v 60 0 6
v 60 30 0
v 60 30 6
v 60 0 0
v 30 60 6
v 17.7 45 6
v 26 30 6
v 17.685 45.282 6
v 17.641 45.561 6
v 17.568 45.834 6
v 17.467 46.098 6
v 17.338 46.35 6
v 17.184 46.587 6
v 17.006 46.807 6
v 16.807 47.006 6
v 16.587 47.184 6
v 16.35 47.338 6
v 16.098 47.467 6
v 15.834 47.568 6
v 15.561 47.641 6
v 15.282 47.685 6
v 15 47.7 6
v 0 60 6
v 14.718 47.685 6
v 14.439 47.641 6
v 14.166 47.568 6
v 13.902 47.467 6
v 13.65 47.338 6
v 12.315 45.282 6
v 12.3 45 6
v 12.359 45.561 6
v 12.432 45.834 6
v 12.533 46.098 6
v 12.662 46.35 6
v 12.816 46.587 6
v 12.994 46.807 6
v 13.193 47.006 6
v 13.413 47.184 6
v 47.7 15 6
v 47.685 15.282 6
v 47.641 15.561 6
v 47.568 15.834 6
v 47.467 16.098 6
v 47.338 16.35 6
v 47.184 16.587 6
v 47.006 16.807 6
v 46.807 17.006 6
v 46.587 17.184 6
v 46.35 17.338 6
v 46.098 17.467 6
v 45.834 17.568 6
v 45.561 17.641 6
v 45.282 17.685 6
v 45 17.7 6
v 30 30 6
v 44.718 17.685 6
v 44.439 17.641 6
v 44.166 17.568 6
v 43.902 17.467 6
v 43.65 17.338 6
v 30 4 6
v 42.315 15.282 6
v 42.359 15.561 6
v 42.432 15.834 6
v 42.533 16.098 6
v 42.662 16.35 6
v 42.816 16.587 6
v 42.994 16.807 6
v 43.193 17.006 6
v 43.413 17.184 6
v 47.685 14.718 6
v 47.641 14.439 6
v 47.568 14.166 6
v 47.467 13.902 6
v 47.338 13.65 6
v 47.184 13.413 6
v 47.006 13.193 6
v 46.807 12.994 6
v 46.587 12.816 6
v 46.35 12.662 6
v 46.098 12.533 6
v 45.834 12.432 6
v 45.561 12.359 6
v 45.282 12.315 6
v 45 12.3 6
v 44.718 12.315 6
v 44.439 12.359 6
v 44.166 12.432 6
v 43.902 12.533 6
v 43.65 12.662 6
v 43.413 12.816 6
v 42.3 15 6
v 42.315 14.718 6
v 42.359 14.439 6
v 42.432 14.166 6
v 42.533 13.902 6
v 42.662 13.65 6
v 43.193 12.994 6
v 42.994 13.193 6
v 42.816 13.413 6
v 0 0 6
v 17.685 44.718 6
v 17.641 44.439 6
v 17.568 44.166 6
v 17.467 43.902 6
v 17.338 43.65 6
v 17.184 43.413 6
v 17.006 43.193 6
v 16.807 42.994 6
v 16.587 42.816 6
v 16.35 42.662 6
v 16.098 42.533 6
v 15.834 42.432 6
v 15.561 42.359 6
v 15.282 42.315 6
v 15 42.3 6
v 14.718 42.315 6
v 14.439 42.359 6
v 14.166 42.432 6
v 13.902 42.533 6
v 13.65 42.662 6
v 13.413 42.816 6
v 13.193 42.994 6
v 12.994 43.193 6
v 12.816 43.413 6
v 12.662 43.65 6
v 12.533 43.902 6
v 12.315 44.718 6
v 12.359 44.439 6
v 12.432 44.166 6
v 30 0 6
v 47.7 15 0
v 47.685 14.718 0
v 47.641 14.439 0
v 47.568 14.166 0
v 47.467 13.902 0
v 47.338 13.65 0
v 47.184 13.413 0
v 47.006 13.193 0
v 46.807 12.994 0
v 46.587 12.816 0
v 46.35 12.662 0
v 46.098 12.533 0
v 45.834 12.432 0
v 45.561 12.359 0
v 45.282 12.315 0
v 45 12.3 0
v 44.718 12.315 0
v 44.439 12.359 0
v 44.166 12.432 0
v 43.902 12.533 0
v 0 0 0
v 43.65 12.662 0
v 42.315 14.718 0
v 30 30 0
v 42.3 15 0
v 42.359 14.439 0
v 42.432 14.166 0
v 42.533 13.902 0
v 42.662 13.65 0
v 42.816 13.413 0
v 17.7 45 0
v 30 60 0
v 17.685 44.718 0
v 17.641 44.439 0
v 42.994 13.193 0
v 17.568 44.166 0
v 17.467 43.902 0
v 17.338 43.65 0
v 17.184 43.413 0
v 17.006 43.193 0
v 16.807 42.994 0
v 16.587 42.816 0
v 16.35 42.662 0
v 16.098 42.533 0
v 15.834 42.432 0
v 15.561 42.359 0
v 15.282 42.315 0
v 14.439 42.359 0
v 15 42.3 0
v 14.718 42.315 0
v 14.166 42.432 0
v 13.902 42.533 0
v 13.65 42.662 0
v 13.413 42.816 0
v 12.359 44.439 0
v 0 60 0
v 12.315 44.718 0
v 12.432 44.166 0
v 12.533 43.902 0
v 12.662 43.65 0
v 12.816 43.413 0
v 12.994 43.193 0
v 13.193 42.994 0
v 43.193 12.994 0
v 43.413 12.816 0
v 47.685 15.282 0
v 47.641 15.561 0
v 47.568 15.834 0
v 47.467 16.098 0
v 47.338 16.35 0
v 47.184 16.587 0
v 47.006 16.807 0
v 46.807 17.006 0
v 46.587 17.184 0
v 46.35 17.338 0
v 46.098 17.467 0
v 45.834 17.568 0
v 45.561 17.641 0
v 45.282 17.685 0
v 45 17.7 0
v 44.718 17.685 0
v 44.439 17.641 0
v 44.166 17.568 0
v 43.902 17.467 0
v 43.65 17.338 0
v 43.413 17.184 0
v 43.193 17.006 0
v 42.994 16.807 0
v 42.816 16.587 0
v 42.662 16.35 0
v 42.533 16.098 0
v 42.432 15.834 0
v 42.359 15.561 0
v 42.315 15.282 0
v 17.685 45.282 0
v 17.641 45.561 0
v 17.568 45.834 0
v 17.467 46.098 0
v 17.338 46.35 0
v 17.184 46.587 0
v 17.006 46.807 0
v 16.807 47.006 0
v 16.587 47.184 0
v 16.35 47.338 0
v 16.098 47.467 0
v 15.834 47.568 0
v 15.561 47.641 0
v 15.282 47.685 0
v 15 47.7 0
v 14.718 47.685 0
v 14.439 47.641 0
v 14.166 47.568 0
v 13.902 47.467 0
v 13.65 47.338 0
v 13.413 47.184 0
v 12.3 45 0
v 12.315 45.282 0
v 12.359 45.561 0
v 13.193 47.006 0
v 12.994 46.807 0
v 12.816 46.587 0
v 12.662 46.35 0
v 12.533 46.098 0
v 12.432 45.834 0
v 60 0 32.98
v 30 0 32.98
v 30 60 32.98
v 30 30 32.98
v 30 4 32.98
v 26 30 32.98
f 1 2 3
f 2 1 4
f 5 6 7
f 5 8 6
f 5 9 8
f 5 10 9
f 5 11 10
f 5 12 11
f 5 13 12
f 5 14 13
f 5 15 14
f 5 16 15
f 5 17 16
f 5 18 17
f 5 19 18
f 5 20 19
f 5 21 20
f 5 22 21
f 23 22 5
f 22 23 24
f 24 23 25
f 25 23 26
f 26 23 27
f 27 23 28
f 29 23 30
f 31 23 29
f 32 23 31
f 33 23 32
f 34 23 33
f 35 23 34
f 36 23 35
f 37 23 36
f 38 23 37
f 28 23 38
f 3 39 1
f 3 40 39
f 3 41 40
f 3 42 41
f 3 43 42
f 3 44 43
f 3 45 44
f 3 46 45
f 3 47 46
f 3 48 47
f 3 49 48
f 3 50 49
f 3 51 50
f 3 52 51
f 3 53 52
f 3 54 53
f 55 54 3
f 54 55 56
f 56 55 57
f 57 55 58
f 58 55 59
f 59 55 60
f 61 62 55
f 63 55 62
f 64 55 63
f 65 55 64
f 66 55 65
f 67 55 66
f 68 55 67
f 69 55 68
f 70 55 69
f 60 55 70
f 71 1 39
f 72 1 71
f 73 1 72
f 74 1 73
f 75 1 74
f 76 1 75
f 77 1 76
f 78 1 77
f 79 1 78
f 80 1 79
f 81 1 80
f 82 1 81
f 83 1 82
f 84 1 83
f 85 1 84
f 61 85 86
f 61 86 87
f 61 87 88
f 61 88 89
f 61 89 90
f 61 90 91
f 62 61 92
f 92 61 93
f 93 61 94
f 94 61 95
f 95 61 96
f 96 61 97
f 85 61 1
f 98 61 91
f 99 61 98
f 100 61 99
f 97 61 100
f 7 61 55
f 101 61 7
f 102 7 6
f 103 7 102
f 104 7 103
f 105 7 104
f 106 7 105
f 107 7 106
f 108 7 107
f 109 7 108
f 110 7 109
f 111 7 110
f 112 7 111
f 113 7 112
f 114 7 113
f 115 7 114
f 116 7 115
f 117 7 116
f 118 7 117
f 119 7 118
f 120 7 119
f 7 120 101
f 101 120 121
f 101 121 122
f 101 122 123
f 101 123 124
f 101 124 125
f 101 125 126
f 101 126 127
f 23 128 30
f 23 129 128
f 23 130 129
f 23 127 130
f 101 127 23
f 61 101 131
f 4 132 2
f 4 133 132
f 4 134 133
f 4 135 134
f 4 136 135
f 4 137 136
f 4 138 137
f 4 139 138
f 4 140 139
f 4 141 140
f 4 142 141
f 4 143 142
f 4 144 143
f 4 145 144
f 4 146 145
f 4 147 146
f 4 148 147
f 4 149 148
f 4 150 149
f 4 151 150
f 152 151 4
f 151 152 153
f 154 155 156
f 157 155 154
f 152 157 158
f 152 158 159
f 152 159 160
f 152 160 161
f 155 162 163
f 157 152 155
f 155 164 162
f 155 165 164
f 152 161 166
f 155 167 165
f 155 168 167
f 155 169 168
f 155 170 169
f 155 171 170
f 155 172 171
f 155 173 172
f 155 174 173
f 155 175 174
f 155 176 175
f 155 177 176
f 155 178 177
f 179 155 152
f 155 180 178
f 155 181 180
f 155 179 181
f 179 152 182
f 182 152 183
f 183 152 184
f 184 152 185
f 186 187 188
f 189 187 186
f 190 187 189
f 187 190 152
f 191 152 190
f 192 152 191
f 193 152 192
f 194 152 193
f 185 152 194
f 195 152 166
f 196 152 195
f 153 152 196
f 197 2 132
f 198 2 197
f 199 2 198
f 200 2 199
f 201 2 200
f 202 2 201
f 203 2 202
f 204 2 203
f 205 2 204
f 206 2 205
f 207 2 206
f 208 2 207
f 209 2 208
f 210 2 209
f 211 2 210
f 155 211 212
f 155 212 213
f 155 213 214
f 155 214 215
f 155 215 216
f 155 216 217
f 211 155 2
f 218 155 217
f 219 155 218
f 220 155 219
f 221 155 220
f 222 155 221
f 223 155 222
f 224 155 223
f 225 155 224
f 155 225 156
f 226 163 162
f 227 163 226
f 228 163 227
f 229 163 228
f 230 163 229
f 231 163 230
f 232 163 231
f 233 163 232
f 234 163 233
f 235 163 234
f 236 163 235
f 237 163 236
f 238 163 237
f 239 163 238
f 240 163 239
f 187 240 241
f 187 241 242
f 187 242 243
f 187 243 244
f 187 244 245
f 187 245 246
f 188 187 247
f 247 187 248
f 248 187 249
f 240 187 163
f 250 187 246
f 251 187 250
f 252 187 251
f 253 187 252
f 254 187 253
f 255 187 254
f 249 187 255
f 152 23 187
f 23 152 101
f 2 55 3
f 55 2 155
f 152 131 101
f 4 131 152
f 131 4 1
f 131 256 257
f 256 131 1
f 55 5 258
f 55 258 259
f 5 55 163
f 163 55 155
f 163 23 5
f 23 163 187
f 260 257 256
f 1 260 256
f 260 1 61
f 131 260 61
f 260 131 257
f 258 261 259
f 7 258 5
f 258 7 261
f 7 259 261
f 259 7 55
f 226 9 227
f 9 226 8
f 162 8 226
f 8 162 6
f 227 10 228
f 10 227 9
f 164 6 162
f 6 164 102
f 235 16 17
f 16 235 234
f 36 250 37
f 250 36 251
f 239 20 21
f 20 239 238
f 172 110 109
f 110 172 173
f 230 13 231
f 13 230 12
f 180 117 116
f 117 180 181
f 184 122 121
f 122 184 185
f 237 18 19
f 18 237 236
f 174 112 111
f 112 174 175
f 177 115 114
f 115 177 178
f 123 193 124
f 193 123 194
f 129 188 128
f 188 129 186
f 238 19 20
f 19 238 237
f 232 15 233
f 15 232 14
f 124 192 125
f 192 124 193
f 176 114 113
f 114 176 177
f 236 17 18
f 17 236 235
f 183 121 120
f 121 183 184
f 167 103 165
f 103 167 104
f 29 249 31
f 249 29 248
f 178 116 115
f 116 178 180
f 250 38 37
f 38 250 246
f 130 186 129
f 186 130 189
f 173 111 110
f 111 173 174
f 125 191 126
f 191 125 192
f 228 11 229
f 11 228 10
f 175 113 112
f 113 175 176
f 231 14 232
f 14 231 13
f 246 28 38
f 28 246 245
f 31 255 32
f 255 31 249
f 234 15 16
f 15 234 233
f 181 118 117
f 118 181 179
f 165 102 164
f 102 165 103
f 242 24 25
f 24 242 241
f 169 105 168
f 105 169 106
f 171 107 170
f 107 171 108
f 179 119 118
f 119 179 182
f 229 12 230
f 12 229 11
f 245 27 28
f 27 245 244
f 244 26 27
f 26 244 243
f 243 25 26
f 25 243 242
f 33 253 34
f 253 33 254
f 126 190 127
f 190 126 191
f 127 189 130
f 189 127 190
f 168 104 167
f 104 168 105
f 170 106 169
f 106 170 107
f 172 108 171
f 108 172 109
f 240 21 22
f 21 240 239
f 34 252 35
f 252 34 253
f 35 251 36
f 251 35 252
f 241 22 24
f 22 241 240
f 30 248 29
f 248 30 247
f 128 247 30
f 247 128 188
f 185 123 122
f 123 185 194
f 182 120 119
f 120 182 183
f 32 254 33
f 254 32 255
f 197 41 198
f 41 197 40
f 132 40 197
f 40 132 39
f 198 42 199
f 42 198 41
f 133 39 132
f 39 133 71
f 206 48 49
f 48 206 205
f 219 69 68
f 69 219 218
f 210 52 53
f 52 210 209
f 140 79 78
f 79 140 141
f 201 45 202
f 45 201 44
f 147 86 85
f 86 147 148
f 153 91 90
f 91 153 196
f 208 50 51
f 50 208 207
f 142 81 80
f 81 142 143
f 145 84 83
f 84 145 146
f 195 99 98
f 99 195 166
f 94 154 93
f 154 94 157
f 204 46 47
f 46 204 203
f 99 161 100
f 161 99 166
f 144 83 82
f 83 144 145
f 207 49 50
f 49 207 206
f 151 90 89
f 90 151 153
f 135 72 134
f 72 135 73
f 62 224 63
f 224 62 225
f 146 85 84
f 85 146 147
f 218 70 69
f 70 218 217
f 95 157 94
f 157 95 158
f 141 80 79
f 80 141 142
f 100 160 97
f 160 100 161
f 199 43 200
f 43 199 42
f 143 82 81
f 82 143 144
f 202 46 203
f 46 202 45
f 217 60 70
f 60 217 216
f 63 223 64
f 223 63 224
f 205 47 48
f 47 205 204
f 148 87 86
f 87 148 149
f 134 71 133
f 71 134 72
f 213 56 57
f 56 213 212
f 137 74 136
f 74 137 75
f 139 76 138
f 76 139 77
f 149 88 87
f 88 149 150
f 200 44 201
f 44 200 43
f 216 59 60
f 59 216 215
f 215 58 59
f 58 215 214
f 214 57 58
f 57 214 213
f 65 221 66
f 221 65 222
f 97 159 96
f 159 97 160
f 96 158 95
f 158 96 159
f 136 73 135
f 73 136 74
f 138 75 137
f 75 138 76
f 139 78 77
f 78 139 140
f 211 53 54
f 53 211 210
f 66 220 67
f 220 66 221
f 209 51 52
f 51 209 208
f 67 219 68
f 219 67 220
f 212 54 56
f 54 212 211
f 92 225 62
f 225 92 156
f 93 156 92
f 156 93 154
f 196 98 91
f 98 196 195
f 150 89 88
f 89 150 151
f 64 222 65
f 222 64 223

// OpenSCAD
// Reinforced right-angle gusset for 30 mm profile.
$fn = 60;
eps = 0.02;
profile = 30;
arm = 60;
plate_t = 6;
rib_t = 4;
rib_h = 27;
module rib_x() {
    translate([profile, 0, plate_t - eps]) linear_extrude(height = rib_h)
        polygon(points = [[0, 0], [arm - profile, 0], [0, rib_t]]);
}
module rib_y() {
    translate([profile, profile, plate_t - eps]) rotate([0, 0, 90]) linear_extrude(height = rib_h)
        polygon(points = [[0, 0], [arm - profile, 0], [0, rib_t]]);
}
difference() {
    union() { cube([arm, profile, plate_t]); cube([profile, arm, plate_t]); rib_x(); rib_y(); }
    for (p = [[profile / 2, arm - profile / 2], [arm - profile / 2, profile / 2]])
        translate([p[0], p[1], -eps]) cylinder(d = 5.4, h = plate_t + 2 * eps);
}
